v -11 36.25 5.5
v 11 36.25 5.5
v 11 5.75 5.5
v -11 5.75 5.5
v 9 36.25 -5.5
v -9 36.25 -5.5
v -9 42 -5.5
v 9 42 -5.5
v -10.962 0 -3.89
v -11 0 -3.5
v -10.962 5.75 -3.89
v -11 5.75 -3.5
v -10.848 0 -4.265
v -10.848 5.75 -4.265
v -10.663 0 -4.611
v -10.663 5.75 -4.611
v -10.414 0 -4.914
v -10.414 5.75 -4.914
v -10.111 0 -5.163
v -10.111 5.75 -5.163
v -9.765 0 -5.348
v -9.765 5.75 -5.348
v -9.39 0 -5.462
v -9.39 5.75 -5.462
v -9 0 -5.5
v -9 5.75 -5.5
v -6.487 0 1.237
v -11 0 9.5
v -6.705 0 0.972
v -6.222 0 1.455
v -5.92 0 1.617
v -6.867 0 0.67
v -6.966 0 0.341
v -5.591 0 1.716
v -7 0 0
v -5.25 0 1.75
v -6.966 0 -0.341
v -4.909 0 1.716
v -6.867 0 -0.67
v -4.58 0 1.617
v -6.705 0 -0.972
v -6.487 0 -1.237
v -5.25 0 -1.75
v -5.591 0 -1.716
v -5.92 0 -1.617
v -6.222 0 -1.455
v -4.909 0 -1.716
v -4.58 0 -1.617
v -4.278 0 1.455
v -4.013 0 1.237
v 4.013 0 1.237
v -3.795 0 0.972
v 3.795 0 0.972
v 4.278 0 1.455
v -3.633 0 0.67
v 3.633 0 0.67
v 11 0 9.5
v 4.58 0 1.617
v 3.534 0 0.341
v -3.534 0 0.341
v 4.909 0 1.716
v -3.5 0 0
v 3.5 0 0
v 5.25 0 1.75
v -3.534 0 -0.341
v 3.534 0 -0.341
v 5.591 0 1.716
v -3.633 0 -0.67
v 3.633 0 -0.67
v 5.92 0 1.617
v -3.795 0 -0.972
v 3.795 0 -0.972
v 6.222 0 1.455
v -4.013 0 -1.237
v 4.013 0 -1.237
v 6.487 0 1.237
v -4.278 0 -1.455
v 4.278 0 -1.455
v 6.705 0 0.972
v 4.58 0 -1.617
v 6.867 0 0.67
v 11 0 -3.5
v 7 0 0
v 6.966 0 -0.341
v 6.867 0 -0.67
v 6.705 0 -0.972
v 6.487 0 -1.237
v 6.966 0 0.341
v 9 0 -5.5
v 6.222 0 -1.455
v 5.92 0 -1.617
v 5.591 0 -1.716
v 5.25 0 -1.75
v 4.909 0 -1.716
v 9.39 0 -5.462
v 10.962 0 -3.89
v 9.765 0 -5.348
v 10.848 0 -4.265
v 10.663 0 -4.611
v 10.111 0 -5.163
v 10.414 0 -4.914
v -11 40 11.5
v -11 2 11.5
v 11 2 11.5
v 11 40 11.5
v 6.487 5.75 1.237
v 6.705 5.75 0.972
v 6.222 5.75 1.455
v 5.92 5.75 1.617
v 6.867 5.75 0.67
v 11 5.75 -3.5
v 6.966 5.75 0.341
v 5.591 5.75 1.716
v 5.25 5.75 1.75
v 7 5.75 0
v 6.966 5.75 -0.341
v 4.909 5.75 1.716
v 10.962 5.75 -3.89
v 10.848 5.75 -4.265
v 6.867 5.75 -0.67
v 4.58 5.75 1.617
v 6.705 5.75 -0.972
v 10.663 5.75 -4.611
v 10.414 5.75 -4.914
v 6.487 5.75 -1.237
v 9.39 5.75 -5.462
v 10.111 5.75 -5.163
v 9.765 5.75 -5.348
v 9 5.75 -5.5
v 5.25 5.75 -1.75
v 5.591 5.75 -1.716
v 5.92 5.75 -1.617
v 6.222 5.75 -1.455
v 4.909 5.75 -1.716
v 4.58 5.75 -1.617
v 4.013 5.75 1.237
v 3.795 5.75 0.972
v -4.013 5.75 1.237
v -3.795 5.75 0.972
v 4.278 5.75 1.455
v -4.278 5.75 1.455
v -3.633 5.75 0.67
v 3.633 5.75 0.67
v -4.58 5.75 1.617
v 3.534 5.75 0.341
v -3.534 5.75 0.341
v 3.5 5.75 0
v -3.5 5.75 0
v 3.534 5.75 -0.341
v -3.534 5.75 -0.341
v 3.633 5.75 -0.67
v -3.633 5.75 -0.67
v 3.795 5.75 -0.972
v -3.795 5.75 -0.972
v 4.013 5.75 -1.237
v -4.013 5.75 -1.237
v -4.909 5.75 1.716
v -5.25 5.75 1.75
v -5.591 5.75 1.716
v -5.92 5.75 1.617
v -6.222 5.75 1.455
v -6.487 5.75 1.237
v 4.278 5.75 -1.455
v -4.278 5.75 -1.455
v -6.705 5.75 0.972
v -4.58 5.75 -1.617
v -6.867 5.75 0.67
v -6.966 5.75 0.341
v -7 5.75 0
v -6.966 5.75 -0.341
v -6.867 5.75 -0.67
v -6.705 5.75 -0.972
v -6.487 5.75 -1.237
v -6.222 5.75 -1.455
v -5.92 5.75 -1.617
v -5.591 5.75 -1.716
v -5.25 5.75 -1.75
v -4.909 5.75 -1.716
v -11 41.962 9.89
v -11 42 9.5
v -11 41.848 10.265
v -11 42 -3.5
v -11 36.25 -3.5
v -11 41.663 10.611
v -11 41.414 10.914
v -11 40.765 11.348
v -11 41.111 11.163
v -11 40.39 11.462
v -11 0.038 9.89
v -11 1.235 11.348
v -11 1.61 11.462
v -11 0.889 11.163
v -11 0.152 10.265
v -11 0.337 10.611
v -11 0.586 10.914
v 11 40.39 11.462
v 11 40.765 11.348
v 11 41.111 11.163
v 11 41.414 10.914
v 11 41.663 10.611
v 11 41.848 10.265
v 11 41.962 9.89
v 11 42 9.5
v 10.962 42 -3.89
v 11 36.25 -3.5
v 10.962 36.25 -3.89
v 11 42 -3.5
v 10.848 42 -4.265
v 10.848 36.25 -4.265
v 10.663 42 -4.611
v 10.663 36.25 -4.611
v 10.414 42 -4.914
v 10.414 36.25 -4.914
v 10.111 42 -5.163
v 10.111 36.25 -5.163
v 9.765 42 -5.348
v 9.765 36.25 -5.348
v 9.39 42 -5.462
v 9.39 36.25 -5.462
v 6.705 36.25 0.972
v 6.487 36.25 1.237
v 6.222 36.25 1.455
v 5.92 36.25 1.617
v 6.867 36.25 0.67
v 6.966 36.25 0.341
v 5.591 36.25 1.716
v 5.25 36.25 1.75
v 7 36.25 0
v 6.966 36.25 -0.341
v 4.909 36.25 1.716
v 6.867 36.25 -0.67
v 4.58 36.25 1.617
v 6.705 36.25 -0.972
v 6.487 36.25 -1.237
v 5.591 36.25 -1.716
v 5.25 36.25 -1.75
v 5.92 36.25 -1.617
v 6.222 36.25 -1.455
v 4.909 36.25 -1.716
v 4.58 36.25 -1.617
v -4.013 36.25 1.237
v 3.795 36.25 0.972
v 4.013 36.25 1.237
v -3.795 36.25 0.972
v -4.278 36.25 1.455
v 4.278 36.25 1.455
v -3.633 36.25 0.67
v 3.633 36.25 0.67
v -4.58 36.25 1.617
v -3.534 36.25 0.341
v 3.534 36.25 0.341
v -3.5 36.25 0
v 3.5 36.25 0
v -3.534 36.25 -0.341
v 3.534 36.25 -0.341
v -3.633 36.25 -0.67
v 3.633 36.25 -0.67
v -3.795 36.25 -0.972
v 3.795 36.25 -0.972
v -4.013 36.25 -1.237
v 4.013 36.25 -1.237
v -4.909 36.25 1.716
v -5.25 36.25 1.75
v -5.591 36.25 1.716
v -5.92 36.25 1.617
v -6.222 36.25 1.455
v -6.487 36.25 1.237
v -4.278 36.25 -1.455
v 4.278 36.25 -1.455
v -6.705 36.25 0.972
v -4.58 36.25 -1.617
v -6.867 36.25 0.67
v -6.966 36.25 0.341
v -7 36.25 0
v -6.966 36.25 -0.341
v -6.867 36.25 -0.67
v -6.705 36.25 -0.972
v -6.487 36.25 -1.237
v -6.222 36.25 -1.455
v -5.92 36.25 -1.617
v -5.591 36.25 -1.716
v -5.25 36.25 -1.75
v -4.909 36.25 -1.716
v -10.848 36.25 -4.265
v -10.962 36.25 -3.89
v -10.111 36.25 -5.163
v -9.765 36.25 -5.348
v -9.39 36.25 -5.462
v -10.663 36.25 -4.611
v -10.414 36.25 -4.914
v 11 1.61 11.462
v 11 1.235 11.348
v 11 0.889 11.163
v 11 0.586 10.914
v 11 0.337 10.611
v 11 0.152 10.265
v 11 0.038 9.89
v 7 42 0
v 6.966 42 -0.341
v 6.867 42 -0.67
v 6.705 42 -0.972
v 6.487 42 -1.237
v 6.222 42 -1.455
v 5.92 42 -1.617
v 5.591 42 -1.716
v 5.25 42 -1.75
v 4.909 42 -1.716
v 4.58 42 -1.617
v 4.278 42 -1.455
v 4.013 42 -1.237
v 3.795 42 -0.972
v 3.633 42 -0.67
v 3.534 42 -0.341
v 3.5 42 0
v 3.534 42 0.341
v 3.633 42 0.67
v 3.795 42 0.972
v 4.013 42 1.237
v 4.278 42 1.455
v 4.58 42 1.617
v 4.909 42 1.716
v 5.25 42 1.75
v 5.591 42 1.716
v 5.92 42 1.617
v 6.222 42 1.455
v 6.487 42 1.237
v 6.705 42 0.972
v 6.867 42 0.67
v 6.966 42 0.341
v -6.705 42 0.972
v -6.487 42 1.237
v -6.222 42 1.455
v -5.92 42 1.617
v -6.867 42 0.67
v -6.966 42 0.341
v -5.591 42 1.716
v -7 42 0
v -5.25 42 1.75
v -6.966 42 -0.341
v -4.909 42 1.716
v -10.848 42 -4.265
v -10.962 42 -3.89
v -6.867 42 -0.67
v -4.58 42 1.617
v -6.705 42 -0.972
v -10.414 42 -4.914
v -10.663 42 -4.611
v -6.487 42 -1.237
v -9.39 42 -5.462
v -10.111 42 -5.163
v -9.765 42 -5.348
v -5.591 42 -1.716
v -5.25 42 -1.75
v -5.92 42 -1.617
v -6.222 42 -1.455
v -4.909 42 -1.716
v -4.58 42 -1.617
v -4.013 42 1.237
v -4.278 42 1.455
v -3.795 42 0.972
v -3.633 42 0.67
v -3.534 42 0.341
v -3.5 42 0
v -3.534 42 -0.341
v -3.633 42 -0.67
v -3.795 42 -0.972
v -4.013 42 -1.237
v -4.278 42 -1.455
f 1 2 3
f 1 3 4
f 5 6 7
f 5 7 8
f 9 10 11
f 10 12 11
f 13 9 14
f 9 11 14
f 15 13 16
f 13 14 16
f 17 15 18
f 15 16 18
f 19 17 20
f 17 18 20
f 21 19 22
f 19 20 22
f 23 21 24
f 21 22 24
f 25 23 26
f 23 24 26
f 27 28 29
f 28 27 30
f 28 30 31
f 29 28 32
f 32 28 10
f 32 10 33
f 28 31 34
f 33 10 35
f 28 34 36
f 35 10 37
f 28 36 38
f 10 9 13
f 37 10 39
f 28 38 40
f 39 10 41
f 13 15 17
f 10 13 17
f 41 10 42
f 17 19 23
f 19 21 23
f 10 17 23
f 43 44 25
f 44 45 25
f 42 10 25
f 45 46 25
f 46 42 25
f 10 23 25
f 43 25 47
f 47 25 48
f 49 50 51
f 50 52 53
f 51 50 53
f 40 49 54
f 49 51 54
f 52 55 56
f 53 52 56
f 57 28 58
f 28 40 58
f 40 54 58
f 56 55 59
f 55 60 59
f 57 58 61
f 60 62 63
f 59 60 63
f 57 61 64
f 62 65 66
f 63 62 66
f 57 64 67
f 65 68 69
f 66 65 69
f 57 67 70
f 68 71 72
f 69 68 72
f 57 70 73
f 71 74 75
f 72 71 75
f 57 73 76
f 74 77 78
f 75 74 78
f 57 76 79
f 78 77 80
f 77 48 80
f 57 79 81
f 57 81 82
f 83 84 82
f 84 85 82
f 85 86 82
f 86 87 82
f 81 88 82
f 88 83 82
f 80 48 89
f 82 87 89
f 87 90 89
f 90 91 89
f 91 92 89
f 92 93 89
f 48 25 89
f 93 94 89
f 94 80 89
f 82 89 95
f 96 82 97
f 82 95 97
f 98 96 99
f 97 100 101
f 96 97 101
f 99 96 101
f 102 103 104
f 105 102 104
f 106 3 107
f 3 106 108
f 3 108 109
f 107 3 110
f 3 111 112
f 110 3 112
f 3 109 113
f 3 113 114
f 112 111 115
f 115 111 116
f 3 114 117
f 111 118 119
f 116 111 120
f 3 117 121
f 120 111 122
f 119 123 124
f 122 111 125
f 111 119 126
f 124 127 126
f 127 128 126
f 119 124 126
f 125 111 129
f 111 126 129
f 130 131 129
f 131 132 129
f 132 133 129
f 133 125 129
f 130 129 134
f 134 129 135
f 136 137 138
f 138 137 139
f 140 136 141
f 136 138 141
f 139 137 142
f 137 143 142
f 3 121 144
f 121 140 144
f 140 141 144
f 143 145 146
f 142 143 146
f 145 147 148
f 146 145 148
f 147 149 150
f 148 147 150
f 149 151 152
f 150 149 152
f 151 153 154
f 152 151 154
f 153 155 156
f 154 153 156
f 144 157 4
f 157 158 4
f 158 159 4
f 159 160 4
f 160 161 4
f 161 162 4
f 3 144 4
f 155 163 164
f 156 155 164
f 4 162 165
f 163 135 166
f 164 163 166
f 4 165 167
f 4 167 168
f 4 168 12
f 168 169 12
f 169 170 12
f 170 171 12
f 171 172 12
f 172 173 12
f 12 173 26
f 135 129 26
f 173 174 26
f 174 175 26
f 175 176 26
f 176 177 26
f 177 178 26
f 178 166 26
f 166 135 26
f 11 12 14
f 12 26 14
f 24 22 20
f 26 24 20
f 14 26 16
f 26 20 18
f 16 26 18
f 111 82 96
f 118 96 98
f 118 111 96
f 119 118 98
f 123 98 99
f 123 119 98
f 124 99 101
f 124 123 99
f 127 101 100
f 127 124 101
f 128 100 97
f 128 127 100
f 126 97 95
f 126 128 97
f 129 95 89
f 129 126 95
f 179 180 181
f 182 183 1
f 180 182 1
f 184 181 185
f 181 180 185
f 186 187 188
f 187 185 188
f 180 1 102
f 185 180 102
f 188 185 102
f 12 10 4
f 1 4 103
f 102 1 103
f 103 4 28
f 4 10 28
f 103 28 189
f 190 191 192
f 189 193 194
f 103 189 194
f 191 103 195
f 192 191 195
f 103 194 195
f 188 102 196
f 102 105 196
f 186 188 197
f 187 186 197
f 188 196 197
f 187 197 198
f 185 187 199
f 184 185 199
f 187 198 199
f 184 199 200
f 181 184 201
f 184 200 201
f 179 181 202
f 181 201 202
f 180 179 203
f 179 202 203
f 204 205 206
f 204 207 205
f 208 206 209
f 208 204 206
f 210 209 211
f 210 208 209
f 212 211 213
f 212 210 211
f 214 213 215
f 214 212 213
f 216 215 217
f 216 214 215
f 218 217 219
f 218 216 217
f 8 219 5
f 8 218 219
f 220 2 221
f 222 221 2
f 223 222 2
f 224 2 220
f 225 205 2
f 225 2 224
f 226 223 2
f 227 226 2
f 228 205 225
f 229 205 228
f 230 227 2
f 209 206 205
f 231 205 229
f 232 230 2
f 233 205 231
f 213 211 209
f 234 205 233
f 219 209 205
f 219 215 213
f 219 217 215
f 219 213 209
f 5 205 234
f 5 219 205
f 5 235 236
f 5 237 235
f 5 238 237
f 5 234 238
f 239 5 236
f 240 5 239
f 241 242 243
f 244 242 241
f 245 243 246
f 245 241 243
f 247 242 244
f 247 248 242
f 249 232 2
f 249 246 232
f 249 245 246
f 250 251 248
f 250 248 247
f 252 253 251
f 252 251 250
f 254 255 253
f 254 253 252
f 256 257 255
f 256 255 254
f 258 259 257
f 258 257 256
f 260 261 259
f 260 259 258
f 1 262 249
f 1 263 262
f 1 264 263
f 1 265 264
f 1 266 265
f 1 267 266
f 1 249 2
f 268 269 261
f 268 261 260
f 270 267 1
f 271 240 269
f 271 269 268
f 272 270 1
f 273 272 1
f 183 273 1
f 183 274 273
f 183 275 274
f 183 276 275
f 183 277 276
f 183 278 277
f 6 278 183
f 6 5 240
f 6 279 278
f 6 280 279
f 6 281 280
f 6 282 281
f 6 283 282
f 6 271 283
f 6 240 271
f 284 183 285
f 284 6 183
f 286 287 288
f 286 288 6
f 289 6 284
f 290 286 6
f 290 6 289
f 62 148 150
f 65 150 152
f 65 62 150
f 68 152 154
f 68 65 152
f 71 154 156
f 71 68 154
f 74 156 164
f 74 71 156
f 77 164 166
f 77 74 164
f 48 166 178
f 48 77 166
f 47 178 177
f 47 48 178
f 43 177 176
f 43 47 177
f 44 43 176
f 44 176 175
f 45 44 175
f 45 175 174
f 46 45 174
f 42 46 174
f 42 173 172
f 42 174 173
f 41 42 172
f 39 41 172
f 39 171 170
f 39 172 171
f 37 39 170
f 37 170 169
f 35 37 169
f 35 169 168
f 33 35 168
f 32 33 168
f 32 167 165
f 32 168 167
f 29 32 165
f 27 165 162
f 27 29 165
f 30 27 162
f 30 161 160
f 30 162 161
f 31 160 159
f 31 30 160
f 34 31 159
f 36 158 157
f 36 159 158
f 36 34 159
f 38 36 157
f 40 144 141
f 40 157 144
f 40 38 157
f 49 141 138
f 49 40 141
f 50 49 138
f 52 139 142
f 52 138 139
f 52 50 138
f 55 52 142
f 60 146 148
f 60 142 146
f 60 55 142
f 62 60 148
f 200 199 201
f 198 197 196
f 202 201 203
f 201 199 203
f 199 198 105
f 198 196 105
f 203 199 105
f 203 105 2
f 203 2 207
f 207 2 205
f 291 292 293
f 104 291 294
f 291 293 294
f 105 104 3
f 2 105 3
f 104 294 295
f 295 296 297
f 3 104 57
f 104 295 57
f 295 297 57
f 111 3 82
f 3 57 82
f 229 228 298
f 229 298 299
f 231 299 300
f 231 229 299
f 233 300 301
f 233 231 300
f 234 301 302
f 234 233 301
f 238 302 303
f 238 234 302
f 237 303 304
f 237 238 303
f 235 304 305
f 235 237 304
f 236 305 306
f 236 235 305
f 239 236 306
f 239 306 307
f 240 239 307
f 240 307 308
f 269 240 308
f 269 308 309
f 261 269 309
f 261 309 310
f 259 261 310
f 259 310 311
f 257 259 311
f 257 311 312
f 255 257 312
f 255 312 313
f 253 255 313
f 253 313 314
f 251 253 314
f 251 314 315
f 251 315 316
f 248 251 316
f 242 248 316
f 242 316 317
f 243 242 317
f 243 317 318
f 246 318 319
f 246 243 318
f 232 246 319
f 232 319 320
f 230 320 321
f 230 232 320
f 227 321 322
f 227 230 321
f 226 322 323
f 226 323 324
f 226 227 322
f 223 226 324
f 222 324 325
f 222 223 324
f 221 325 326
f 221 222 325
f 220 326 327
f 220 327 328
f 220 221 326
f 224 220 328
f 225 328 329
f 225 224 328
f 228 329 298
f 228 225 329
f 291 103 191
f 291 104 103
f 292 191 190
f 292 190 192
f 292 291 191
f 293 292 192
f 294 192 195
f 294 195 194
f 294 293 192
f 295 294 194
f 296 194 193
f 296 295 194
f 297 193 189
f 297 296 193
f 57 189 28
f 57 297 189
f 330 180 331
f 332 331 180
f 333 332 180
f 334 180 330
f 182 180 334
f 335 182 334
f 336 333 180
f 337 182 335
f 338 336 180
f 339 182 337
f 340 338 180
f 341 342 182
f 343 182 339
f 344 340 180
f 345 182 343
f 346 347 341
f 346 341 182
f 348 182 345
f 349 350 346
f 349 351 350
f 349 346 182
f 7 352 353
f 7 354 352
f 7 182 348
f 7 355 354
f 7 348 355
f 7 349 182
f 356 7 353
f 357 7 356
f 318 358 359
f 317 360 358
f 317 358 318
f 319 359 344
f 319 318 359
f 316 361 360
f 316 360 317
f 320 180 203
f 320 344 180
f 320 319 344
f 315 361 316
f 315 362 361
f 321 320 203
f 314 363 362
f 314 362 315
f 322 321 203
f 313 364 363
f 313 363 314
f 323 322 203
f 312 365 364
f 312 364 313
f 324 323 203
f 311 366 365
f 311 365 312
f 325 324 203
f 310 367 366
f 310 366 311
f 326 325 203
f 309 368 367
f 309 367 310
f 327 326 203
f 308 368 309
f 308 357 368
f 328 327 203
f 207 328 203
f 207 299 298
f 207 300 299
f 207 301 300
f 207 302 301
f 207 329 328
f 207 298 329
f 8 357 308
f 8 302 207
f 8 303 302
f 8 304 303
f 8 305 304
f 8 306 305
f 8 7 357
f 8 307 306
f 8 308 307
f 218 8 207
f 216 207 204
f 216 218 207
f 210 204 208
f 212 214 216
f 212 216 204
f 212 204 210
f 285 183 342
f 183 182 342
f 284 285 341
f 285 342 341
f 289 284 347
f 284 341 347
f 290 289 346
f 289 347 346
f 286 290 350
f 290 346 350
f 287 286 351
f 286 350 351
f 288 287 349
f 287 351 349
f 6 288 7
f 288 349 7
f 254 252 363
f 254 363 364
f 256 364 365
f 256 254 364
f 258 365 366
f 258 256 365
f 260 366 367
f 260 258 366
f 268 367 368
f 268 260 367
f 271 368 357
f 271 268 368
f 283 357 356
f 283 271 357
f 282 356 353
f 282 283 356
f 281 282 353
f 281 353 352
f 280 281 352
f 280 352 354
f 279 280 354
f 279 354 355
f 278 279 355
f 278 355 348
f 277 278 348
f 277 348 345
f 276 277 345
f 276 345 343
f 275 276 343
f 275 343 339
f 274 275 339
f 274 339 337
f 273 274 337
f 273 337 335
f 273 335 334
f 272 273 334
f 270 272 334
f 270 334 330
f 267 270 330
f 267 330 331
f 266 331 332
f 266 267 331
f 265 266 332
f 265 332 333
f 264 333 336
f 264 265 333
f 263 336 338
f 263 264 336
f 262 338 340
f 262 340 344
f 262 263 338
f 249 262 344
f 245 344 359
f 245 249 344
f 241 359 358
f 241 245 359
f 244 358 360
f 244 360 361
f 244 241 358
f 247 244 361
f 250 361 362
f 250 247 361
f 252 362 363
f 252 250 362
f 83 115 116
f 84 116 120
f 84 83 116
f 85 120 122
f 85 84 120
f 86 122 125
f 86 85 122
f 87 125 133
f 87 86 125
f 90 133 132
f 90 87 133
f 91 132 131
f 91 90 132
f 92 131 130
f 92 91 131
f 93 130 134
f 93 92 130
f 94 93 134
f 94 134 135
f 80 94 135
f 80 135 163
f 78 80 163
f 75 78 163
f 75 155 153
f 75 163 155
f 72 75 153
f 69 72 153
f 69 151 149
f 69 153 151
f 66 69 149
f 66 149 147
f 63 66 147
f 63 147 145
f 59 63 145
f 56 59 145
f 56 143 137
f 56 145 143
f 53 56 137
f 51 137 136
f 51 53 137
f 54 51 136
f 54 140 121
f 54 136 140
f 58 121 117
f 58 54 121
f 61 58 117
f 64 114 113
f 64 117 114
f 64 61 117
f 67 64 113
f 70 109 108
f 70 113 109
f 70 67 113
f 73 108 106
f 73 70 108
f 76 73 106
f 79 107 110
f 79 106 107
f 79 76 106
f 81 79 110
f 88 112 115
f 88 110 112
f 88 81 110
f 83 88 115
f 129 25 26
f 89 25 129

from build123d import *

# Parameters (mm, degrees)
SKETCH1_W           = 22
SKETCH1_H           = 6
SKETCH1_H_2         = 11
SKETCH1_R           = 1.75
BOSS_EXTRUDE1_DEPTH = 42
SKETCH2_W           = 22
SKETCH2_H           = 30.5
CUT_EXTRUDE1_DEPTH  = 11
FILLET1_R           = 2


with BuildPart() as part:
    # Sketch1 → Boss-Extrude1 (new body)
    with BuildSketch(Plane(origin=(0, 0, 0), x_dir=(1, 0, 0), z_dir=(0, 1, 0))):
        with Locations((0, -8.5)):
            Rectangle(SKETCH1_W, SKETCH1_H)
        Rectangle(SKETCH1_W, SKETCH1_H_2)
        with Locations((5.25, 0)):
            Circle(SKETCH1_R, mode=Mode.SUBTRACT)
        with Locations((-5.25, 0)):
            Circle(SKETCH1_R, mode=Mode.SUBTRACT)
    extrude(amount=BOSS_EXTRUDE1_DEPTH)

    # Sketch2 → Cut-Extrude1 (cut)
    with BuildSketch(Plane(origin=(0, 0, -5.5), x_dir=(-1, 0, 0), z_dir=(0, 0, -1))):
        with Locations((0, 21)):
            Rectangle(SKETCH2_W, SKETCH2_H)
    extrude(amount=-CUT_EXTRUDE1_DEPTH, mode=Mode.SUBTRACT)

    # Fillet1
    fillet1_edges = [part.edges().sort_by_distance(p)[0] for p in [
        (0, 0, 11.5),
        (-11, 39.125, -5.5),
        (11, 39.125, -5.5),
        (-11, 2.875, -5.5),
        (11, 2.875, -5.5),
        (0, 42, 11.5),
    ]]
    fillet(fillet1_edges, radius=FILLET1_R)


solid = part.part
